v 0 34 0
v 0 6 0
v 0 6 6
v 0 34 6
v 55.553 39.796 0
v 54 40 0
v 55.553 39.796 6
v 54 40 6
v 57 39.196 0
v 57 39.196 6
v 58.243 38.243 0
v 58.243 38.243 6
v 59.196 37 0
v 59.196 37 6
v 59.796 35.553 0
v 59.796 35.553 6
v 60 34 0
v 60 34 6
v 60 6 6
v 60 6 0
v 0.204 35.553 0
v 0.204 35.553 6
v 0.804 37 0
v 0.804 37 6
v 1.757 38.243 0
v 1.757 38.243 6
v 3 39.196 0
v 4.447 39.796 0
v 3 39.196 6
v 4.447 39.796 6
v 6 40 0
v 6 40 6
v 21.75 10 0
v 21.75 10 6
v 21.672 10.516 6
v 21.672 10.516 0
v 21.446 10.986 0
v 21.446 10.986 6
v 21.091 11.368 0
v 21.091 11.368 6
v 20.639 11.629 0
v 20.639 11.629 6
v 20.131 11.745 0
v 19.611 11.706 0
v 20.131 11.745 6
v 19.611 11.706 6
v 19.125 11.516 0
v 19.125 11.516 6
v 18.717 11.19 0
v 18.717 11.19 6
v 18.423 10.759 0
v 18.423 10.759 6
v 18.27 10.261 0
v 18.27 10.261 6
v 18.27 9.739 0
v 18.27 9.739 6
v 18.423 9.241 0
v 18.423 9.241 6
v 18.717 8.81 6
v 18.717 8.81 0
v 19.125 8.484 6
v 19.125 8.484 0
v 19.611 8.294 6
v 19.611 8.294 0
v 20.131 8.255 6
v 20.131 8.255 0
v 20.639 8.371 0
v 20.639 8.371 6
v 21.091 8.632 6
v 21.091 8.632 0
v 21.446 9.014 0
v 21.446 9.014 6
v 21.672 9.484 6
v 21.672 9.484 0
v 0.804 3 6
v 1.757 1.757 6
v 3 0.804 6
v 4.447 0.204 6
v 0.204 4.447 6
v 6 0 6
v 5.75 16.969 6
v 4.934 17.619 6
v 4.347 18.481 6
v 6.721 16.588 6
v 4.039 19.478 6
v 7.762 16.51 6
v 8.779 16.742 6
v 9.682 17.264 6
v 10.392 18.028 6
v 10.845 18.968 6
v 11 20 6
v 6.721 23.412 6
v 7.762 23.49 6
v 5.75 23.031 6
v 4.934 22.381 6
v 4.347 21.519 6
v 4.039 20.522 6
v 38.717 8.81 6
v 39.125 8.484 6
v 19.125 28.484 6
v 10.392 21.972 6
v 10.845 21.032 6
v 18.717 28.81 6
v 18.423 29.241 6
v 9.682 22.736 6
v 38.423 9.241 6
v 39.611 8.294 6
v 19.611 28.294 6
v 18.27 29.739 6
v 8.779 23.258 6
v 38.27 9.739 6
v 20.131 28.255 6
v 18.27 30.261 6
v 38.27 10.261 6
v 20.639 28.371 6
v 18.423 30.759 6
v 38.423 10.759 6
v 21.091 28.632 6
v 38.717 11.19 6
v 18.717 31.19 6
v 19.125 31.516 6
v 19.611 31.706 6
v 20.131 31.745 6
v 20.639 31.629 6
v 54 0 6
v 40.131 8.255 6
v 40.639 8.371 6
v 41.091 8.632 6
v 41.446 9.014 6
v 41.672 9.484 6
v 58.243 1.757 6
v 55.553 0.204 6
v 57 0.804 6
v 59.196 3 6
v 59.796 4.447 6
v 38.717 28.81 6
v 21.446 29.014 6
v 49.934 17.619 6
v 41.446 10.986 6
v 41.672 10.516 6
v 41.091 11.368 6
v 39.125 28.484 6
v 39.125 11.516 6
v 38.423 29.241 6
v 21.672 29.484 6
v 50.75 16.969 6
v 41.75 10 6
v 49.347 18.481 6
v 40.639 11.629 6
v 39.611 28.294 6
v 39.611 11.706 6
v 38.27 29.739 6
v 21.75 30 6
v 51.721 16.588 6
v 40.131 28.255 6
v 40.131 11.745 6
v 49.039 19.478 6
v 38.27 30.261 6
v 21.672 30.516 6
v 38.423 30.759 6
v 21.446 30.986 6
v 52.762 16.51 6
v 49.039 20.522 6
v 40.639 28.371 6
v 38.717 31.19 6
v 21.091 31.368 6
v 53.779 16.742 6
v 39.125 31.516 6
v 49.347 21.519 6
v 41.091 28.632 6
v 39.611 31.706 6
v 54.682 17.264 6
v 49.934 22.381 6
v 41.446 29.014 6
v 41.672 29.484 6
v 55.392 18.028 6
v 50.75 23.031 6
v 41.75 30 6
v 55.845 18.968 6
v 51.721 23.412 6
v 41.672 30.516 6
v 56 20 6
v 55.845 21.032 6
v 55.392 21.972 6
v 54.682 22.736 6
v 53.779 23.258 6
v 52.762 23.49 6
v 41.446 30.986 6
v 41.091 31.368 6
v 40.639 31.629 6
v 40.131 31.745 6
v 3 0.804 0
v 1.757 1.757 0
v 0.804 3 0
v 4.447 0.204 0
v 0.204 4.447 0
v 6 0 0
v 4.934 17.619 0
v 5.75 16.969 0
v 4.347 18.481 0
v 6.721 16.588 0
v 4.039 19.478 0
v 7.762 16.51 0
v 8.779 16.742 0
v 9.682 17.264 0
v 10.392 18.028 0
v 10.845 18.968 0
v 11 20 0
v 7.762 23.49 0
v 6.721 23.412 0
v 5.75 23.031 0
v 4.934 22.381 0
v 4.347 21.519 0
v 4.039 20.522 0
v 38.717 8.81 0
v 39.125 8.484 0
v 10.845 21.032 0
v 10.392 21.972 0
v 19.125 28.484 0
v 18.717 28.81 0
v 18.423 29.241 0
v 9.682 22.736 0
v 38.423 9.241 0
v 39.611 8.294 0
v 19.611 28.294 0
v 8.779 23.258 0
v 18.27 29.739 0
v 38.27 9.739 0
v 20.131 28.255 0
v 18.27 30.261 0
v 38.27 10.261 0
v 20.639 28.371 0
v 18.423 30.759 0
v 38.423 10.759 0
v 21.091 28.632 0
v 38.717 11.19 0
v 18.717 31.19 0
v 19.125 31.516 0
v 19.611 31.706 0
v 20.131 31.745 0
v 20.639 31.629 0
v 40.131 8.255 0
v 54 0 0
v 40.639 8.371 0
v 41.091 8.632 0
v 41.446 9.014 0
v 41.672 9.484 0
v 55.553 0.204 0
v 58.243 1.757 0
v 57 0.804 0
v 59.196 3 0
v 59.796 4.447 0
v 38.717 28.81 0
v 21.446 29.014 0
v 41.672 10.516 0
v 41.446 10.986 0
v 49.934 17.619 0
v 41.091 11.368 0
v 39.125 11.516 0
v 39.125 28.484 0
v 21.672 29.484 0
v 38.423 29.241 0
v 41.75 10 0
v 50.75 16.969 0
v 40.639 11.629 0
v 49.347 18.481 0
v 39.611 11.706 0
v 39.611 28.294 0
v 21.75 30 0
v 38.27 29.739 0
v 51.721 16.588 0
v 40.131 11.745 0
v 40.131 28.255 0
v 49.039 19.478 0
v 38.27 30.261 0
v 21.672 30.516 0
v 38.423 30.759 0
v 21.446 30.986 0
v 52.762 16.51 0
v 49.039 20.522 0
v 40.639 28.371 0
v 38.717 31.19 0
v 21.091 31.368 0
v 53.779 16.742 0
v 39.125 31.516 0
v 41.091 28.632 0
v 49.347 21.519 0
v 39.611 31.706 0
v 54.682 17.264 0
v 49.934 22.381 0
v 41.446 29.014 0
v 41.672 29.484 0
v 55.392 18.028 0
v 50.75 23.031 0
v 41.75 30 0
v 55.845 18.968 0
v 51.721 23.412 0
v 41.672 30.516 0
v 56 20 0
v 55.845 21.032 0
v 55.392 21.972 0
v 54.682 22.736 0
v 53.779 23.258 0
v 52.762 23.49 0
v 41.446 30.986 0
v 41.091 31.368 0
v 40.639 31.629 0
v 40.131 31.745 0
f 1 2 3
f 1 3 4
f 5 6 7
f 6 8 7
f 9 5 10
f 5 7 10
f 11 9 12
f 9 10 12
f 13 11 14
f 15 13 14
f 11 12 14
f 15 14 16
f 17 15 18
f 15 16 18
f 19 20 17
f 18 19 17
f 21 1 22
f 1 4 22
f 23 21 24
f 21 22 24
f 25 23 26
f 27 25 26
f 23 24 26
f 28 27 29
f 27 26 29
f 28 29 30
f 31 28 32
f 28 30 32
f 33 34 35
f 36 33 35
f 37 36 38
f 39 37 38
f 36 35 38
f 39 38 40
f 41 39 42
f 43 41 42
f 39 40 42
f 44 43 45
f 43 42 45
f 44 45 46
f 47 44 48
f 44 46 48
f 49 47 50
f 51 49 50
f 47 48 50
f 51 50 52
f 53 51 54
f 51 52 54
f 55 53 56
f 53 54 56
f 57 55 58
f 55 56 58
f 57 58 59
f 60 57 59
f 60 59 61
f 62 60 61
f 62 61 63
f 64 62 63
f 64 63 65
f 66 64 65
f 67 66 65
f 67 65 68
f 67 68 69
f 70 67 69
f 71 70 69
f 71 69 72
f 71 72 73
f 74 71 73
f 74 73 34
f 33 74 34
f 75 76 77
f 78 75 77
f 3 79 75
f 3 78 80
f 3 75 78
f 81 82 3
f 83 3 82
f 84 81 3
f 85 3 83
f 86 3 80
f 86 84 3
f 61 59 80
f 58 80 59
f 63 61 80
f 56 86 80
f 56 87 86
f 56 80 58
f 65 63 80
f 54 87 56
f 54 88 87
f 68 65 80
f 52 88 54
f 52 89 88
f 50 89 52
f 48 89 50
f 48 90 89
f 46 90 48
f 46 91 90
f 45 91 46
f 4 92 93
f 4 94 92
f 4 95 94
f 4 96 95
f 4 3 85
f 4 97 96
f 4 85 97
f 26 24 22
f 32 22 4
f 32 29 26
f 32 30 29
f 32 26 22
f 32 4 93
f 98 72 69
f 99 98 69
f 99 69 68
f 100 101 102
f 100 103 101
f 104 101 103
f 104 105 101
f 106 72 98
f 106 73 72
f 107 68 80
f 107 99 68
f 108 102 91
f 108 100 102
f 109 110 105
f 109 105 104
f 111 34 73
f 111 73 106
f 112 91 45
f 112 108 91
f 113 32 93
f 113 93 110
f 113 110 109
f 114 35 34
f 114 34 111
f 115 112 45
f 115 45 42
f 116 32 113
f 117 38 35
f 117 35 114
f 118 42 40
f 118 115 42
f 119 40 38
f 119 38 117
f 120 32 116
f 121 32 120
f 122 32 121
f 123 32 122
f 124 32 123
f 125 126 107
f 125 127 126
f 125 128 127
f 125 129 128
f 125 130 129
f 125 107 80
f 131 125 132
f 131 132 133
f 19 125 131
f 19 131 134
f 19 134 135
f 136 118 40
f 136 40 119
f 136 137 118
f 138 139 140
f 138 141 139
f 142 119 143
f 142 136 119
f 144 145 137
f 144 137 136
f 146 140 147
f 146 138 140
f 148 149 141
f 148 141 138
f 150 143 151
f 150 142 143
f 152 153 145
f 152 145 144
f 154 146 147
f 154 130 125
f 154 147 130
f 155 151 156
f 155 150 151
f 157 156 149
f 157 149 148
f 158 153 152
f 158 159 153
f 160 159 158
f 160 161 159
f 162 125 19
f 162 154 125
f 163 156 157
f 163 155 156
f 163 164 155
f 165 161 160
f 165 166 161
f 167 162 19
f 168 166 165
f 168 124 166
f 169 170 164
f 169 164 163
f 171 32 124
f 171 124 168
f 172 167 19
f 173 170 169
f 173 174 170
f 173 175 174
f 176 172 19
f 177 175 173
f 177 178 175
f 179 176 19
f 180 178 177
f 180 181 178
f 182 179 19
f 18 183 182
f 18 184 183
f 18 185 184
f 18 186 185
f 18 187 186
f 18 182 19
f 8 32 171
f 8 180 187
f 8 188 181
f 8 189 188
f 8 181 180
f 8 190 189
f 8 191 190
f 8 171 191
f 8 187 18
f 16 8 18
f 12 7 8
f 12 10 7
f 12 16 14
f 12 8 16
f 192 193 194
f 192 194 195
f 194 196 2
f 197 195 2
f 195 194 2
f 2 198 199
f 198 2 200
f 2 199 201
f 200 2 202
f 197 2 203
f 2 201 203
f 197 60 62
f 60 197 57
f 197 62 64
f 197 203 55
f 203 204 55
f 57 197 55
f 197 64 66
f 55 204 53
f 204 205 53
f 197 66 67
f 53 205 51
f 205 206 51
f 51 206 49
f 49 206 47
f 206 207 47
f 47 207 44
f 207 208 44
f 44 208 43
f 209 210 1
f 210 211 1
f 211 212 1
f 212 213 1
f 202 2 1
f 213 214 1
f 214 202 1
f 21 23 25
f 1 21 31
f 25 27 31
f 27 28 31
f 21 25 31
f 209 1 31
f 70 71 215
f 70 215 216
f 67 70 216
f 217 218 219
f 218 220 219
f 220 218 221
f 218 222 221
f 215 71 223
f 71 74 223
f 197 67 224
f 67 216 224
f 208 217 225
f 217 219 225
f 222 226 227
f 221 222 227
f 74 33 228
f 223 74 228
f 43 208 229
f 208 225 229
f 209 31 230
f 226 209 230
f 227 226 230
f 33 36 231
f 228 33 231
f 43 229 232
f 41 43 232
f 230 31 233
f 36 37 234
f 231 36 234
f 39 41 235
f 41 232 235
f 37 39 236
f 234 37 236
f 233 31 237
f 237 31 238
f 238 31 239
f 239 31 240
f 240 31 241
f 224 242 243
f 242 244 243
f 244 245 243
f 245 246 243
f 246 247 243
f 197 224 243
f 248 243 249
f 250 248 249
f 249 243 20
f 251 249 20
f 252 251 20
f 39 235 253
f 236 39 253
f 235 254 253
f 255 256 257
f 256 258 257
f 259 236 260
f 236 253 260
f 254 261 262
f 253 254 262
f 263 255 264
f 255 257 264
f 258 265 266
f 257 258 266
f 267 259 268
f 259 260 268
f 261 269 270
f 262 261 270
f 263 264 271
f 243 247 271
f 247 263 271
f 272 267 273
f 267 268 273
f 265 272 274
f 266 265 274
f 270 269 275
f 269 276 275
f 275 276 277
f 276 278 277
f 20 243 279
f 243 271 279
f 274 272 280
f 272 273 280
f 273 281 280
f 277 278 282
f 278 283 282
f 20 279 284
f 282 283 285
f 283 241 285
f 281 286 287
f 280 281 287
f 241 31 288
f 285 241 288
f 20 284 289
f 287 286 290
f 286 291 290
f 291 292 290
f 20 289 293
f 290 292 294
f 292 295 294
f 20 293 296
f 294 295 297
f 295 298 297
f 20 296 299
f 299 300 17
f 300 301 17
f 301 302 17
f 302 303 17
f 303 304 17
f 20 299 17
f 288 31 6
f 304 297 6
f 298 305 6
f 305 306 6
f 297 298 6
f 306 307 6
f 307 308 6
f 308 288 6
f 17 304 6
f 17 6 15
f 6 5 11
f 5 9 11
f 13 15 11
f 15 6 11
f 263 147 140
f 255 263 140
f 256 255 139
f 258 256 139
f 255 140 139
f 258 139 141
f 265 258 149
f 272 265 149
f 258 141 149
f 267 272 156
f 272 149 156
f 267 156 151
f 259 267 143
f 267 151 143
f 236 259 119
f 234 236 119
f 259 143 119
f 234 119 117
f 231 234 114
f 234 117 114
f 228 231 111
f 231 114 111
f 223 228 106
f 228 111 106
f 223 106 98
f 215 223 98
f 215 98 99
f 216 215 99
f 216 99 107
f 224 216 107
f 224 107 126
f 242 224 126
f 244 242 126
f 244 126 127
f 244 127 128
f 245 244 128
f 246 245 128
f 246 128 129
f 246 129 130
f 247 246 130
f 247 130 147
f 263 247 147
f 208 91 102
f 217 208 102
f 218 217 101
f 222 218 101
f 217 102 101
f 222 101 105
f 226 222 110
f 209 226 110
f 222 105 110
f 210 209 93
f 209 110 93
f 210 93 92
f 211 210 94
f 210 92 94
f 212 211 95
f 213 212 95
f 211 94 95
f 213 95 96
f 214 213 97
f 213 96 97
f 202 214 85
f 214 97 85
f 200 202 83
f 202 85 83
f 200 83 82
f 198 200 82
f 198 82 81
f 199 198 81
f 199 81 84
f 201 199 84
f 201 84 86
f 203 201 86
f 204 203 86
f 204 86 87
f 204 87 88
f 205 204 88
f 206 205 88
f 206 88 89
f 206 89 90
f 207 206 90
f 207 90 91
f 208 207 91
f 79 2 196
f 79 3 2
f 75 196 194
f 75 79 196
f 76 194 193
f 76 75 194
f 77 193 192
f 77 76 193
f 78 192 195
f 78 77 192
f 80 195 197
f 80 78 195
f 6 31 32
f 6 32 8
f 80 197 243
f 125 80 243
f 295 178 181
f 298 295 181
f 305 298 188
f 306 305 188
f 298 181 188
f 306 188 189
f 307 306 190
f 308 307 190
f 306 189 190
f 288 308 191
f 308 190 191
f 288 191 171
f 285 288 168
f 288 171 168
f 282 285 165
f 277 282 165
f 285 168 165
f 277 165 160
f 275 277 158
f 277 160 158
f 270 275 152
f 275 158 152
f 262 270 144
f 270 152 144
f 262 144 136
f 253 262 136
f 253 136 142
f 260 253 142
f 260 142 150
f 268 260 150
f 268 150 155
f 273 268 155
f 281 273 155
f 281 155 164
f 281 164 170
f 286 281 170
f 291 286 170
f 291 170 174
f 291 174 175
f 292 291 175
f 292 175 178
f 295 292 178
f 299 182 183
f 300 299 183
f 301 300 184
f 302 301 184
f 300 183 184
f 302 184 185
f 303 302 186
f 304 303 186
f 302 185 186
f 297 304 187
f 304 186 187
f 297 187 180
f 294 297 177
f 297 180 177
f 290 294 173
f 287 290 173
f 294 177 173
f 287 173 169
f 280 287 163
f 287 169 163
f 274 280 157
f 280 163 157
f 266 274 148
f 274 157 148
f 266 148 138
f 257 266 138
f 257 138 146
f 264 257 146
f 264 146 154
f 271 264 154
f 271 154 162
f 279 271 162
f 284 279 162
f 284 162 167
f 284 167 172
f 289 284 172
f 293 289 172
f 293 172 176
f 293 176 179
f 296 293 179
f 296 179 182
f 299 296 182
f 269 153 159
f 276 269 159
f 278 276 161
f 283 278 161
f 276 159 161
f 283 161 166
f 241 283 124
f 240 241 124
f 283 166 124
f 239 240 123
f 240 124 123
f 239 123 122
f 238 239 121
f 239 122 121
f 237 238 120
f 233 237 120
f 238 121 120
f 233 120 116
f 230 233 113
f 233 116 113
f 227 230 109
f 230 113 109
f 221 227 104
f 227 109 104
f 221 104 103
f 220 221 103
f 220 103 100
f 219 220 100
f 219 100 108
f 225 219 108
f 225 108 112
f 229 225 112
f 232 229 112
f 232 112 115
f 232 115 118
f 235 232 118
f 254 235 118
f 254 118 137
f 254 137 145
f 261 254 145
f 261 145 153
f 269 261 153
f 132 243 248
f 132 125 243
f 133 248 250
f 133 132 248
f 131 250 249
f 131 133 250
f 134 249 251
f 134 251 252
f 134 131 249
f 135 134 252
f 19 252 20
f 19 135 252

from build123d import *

# Parameters (mm, degrees)
ESQUISSE1_W                  = 60
ESQUISSE1_H                  = 40
BOSS_EXTRU_1_DEPTH           = 6
ESQUISSE2_R                  = 1.75
ESQUISSE2_R_2                = 3.5
ENL_V_MAT_EXTRU_1_DEPTH      = 1
ENL_V_MAT_EXTRU_1_DEPTH_BACK = 7
CONG_1_R                     = 6


with BuildPart() as part:
    # Esquisse1 → Boss.-Extru.1 (new body)
    with BuildSketch(Plane.XY):
        with Locations((30, 20)):
            Rectangle(ESQUISSE1_W, ESQUISSE1_H)
    extrude(amount=BOSS_EXTRU_1_DEPTH)

    # Esquisse2 → Enlèv. mat.-Extru.1 (cut, two sides)
    with BuildSketch(Plane.XY.offset(6)) as enl_v_mat_extru_1_sk:
        with Locations((20, 30)):
            Circle(ESQUISSE2_R)
        with Locations((40, 30)):
            Circle(ESQUISSE2_R)
        with Locations((40, 10)):
            Circle(ESQUISSE2_R)
        with Locations((20, 10)):
            Circle(ESQUISSE2_R)
        with Locations((7.5, 20)):
            Circle(ESQUISSE2_R_2)
        with Locations((52.5, 20)):
            Circle(ESQUISSE2_R_2)
    extrude(amount=ENL_V_MAT_EXTRU_1_DEPTH, mode=Mode.SUBTRACT)
    extrude(enl_v_mat_extru_1_sk.sketch, amount=-ENL_V_MAT_EXTRU_1_DEPTH_BACK, mode=Mode.SUBTRACT)

    # Congé1
    cong_1_edges = [part.edges().sort_by_distance(p)[0] for p in [
        (0, 40, 3),
        (60, 40, 3),
        (60, 0, 3),
        (0, 0, 3),
    ]]
    fillet(cong_1_edges, radius=CONG_1_R)


solid = part.part
